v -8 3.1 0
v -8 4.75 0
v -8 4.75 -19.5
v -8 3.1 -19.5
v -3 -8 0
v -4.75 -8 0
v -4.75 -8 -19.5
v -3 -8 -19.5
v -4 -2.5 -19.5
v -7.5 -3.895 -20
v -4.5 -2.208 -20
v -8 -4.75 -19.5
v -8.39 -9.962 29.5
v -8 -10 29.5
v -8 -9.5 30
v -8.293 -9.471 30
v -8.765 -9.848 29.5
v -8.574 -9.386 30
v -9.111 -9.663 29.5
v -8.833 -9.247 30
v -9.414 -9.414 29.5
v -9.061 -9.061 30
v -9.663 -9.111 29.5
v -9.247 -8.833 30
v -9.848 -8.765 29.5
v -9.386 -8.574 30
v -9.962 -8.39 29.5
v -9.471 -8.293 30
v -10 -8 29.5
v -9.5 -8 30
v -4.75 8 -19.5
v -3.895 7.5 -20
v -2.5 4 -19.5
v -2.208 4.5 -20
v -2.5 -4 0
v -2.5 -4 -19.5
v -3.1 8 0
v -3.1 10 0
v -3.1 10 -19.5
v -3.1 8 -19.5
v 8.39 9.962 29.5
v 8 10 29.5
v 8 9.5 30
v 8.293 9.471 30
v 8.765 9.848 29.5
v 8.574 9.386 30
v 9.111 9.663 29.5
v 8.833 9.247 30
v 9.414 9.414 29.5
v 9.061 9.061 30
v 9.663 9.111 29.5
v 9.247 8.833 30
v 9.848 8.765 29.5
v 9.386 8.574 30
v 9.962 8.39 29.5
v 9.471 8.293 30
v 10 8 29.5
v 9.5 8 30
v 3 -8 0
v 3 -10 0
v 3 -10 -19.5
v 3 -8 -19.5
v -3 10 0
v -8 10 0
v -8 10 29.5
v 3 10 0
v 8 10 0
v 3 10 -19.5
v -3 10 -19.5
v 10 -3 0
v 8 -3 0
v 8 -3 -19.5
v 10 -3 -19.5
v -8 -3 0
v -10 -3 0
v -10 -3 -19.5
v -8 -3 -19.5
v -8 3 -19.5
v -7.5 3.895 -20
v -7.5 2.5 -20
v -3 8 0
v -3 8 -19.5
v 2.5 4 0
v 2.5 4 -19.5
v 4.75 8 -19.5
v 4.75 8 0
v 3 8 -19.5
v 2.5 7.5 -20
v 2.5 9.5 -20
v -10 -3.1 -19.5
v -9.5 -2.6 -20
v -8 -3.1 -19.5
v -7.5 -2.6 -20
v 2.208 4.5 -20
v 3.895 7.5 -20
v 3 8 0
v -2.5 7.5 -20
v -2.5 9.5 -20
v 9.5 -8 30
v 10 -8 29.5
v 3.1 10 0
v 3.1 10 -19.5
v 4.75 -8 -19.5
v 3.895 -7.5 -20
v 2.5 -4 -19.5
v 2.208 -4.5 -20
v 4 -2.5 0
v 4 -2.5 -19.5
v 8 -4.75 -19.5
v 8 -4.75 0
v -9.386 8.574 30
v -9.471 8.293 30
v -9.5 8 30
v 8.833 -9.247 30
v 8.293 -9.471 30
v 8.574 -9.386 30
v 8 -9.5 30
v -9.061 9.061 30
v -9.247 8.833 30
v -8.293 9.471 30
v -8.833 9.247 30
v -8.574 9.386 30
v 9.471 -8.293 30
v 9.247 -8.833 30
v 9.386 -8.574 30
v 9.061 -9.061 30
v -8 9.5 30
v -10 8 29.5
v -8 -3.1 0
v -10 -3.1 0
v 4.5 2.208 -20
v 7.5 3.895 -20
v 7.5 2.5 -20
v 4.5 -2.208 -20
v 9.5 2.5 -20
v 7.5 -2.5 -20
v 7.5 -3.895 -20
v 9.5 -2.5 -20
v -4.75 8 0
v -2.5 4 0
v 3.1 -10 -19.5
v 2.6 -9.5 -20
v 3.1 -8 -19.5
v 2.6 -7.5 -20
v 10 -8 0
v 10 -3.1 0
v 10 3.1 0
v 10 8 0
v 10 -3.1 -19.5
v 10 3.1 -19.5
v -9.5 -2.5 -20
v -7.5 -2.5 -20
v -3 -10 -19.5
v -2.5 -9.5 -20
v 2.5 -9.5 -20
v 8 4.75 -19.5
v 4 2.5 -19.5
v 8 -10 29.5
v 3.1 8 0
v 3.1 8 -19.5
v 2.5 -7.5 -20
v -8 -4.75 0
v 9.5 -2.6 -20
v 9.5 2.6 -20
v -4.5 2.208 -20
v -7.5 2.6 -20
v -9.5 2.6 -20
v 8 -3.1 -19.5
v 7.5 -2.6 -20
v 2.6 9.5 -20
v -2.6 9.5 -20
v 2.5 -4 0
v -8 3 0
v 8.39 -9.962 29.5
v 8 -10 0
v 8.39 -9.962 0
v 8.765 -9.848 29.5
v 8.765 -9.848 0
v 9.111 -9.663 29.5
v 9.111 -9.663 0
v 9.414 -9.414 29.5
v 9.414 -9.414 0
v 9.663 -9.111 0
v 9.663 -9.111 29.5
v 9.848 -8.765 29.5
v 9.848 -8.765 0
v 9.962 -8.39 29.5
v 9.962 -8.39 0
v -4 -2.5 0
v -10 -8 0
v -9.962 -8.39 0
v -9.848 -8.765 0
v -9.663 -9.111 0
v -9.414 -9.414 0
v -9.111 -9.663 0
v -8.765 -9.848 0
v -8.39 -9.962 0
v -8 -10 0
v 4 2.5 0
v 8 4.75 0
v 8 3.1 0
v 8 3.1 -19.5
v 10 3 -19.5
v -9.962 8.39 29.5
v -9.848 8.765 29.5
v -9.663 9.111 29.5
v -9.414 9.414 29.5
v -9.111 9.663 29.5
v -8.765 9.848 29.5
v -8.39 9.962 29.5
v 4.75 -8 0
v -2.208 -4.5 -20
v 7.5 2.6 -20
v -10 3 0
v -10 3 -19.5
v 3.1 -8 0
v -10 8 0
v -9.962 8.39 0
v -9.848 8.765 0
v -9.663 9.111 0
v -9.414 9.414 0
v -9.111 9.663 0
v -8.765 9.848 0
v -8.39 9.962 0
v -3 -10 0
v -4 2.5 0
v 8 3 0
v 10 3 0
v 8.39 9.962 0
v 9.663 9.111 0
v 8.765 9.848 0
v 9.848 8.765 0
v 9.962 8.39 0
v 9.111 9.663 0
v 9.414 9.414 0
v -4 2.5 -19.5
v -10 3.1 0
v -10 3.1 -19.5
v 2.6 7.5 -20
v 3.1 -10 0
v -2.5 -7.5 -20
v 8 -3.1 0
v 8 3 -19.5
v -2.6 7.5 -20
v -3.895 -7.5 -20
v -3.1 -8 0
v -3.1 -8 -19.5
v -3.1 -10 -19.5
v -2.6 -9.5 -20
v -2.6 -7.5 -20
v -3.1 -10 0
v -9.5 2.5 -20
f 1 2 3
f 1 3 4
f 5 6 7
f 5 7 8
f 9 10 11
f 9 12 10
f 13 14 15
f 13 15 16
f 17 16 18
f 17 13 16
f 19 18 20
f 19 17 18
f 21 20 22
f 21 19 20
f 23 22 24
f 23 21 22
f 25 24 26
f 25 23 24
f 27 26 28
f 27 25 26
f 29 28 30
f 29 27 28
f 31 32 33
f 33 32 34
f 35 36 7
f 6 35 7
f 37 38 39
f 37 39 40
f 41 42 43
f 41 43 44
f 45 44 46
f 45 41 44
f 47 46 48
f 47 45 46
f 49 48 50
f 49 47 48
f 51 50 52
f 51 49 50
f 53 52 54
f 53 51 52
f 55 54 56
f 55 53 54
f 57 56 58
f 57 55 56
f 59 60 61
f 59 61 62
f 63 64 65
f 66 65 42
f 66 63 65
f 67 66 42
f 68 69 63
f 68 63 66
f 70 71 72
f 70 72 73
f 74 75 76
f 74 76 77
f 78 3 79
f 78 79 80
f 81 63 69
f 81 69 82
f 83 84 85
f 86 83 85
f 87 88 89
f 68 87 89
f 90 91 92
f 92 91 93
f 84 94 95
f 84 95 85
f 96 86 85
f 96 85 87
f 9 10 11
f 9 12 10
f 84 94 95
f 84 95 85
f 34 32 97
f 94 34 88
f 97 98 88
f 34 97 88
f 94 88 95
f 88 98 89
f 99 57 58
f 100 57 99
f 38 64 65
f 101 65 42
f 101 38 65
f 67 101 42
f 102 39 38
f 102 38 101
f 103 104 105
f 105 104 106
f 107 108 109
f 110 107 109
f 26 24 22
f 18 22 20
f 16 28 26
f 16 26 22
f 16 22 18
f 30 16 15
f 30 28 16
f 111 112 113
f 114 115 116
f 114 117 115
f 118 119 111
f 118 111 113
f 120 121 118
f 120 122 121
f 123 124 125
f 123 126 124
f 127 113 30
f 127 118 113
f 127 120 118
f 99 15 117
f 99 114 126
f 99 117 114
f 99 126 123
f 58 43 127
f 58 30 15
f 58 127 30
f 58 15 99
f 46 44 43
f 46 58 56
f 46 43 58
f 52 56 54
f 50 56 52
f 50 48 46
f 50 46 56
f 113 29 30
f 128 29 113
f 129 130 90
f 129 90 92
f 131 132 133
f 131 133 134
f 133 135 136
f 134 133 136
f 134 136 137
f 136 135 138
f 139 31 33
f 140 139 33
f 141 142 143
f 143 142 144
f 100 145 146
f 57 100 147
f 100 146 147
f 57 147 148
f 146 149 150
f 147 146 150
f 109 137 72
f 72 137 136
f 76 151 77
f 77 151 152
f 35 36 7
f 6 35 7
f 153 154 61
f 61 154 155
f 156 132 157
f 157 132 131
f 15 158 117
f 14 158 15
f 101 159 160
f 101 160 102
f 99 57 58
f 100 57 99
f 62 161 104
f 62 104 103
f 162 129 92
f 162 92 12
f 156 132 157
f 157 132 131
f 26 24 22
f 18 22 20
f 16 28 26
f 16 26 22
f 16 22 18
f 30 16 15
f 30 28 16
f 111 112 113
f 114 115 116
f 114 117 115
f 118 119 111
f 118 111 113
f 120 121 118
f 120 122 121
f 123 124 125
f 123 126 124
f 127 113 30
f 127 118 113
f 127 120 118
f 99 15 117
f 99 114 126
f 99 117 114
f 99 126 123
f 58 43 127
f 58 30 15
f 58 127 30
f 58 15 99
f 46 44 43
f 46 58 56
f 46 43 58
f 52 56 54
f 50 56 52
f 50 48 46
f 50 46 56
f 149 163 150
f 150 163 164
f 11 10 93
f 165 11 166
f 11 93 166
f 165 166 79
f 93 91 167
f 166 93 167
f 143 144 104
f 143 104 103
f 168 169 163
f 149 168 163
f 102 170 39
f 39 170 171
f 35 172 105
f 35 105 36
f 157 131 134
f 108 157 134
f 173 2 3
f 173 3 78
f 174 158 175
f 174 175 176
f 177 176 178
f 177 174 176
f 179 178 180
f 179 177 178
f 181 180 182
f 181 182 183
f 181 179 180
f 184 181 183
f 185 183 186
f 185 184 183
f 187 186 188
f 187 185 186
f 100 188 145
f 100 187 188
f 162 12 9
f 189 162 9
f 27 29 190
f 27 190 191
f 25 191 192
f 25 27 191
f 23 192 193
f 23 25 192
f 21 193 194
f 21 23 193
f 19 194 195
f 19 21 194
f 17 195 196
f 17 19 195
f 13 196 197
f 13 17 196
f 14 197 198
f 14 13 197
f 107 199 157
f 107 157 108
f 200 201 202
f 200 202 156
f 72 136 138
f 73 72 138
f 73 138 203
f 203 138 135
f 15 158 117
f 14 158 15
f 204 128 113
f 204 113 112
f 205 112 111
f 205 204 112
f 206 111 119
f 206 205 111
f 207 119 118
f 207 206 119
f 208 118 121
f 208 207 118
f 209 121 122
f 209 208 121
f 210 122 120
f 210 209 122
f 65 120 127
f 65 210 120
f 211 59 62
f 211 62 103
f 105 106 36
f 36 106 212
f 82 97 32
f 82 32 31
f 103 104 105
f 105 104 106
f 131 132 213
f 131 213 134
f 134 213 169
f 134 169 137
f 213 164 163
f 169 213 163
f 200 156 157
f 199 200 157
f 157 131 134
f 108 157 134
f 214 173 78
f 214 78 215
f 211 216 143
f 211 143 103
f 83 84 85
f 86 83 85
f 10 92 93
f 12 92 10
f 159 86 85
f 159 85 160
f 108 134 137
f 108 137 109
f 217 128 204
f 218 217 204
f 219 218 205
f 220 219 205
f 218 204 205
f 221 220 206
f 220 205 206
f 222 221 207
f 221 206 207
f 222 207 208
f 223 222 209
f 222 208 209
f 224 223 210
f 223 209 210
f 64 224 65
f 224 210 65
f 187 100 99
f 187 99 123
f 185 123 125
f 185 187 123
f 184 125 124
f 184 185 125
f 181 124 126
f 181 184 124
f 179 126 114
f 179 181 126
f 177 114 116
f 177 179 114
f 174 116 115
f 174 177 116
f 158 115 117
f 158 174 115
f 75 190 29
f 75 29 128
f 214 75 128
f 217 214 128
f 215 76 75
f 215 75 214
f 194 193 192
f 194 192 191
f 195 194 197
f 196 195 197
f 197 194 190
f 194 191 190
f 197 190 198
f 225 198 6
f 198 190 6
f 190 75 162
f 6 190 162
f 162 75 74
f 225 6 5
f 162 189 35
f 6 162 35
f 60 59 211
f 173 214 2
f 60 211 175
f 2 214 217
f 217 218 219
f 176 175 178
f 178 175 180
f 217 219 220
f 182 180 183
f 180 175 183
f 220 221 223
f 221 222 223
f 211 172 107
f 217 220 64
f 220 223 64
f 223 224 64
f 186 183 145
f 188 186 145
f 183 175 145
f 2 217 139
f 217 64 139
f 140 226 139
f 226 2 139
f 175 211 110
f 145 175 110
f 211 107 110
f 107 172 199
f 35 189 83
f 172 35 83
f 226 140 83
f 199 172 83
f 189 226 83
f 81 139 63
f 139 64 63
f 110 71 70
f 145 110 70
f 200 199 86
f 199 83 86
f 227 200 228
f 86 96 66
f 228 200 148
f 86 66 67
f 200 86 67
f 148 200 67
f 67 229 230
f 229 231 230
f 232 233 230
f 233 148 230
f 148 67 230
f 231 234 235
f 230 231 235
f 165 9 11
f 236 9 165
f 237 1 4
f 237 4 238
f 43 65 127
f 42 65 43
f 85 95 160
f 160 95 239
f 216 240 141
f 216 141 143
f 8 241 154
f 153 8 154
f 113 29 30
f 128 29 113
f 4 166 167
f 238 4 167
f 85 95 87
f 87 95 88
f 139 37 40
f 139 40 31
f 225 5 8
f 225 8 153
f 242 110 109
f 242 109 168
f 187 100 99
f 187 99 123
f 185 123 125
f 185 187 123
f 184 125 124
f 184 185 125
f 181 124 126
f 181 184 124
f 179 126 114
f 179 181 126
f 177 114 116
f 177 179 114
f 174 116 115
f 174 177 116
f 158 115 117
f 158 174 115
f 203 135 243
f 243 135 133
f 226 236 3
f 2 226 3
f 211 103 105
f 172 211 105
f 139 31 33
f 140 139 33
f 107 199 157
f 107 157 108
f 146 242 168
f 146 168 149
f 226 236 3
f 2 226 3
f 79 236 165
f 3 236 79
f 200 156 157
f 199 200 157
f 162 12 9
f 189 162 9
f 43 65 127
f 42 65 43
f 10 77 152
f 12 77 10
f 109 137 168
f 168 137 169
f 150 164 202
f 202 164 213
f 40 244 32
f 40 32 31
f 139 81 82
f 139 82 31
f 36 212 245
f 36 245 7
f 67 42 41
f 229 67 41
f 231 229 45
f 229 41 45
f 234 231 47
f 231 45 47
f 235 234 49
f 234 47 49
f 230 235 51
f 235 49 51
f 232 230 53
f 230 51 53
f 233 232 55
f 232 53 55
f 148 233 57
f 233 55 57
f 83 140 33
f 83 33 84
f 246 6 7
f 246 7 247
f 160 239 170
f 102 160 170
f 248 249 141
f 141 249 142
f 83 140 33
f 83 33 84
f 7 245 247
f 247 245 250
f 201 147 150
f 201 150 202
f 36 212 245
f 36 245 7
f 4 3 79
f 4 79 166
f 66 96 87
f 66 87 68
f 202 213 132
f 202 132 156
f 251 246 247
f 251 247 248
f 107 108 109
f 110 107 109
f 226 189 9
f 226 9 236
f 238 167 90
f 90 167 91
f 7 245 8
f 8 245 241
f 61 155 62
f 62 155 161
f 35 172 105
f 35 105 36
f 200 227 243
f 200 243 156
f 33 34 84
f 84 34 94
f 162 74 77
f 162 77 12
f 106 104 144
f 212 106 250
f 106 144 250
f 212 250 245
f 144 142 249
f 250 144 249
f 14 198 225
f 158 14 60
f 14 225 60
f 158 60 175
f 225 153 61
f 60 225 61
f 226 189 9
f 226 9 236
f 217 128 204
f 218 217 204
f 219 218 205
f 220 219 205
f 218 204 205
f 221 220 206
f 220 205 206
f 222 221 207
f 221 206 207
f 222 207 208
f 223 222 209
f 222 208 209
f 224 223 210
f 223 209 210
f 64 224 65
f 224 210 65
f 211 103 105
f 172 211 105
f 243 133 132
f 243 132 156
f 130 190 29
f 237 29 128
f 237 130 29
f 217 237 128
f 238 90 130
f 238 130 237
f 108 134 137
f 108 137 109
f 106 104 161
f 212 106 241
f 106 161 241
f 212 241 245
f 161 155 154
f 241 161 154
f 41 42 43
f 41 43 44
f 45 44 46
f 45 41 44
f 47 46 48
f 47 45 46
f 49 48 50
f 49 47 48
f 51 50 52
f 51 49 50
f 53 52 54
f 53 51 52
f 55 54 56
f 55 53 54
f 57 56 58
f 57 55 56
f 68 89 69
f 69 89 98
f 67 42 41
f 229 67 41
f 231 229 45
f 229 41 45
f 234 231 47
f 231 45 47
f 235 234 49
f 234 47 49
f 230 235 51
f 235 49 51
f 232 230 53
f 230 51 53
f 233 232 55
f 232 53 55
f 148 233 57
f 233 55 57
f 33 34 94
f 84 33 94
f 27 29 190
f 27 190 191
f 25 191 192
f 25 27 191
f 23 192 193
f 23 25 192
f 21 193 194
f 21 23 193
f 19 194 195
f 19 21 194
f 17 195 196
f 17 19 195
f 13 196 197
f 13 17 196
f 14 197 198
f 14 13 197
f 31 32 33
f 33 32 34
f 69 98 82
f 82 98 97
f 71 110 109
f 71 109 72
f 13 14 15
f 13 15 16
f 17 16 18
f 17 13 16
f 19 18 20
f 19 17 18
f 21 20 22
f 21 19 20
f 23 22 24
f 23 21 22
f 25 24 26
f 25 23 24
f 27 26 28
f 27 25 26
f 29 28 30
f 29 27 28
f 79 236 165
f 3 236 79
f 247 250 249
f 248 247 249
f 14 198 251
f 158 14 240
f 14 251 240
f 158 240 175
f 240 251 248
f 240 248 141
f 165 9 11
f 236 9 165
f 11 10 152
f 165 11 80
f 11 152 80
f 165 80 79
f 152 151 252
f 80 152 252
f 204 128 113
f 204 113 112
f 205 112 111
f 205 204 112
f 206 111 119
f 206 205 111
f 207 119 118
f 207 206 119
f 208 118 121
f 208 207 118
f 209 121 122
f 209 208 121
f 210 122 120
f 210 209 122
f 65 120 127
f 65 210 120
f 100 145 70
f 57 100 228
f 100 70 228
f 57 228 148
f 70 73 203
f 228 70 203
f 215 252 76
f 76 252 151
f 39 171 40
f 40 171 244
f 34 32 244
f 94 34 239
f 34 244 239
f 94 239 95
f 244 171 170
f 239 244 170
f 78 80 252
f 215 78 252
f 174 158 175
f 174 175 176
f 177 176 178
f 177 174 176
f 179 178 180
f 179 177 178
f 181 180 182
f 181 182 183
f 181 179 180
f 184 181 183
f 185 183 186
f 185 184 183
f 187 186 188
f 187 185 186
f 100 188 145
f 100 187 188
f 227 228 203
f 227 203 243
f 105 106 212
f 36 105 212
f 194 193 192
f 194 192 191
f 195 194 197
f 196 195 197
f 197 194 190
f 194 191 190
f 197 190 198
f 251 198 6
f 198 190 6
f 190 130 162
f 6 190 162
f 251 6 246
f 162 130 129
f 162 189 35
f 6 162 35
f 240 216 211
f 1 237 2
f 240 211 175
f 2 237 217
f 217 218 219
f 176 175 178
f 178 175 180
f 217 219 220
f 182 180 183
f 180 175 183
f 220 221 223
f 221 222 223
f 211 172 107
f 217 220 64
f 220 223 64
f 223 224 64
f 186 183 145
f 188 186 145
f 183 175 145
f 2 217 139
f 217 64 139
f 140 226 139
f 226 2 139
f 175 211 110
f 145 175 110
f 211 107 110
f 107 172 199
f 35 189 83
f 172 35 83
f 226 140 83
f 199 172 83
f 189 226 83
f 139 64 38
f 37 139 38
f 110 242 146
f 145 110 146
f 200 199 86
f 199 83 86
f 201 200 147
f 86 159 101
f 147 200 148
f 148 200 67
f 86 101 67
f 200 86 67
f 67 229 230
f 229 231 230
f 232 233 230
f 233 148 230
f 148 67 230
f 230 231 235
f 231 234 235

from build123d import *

# Parameters (mm, degrees)
SKETCH001_W           = 20
SKETCH001_H           = 20
PAD_DEPTH             = 30
PAD001_DEPTH          = 20
POLARPATTERN_COUNT    = 4
FILLET_R              = 2
CHAMFER_SIZE          = 0.5
SKETCH003_W           = 20
SKETCH003_H           = 20
PAD002_DEPTH          = 30
PAD003_DEPTH          = 20
POLARPATTERN001_COUNT = 4
FILLET001_R           = 2
CHAMFER001_SIZE       = 0.5


with BuildPart() as f_6mm:
    # Sketch001 → Pad (new body)
    with BuildSketch(Plane.XY):
        Rectangle(SKETCH001_W, SKETCH001_H)
    extrude(amount=PAD_DEPTH)

    # Sketch → Pad001 (join)
    with BuildSketch(Plane.XY):
        Polygon((-2.5, 4), (2.5, 4), (4.75, 8), (3, 8), (3, 10), (-3, 10), (-3, 8), (-4.75, 8), align=None)
    pad001 = extrude(amount=-PAD001_DEPTH)

    # PolarPattern: Pad001 ×4 about axis
    polarpattern_axis = Axis((0, 0, 0), (0, 0, 1))
    for i in range(1, POLARPATTERN_COUNT):
        add(pad001.rotate(polarpattern_axis, i * 360 / POLARPATTERN_COUNT))

    # Fillet
    fillet_edges = [f_6mm.edges().sort_by_distance(p)[0] for p in [
        (-10, 10, 15),
        (10, 10, 15),
        (10, -10, 15),
        (-10, -10, 15),
    ]]
    fillet(fillet_edges, radius=FILLET_R)

    # Chamfer
    chamfer_edges = [f_6mm.edges().sort_by_distance(p)[0] for p in [
        (0, 10, 30),
        (-9.414214, 9.414214, 30),
        (9.414214, 9.414214, 30),
        (-10, 0, 30),
        (10, 0, 30),
        (-9.414214, -9.414214, 30),
        (9.414214, -9.414214, 30),
        (0, -10, 30),
        (0, 4, -20),
        (3.625, 6, -20),
        (3.875, 8, -20),
        (3, 9, -20),
        (0, 10, -20),
        (-3, 9, -20),
        (-3.875, 8, -20),
        (-3.625, 6, -20),
        (4, 0, -20),
        (6, -3.625, -20),
        (8, -3.875, -20),
        (9, -3, -20),
        (10, 0, -20),
        (9, 3, -20),
        (8, 3.875, -20),
        (6, 3.625, -20),
        (0, -4, -20),
        (-3.625, -6, -20),
        (-3.875, -8, -20),
        (-3, -9, -20),
        (0, -10, -20),
        (3, -9, -20),
        (3.875, -8, -20),
        (3.625, -6, -20),
        (-4, 0, -20),
        (-6, 3.625, -20),
        (-8, 3.875, -20),
        (-9, 3, -20),
        (-10, 0, -20),
        (-9, -3, -20),
        (-8, -3.875, -20),
        (-6, -3.625, -20),
    ]]
    chamfer(chamfer_edges, length=CHAMFER_SIZE)


with BuildPart() as f_6_2mm:
    # Sketch003 → Pad002 (new body)
    with BuildSketch(Plane.XY):
        Rectangle(SKETCH003_W, SKETCH003_H)
    extrude(amount=PAD002_DEPTH)

    # Sketch002 → Pad003 (join)
    with BuildSketch(Plane.XY):
        Polygon((-2.5, 4), (2.5, 4), (4.75, 8), (3.1, 8), (3.1, 10), (-3.1, 10), (-3.1, 8), (-4.75, 8), align=None)
    pad003 = extrude(amount=-PAD003_DEPTH)

    # PolarPattern001: Pad003 ×4 about axis
    polarpattern001_axis = Axis((0, 0, 0), (0, 0, 1))
    for i in range(1, POLARPATTERN001_COUNT):
        add(pad003.rotate(polarpattern001_axis, i * 360 / POLARPATTERN001_COUNT))

    # Fillet001
    fillet001_edges = [f_6_2mm.edges().sort_by_distance(p)[0] for p in [
        (-10, 10, 15),
        (10, 10, 15),
        (10, -10, 15),
        (-10, -10, 15),
    ]]
    fillet(fillet001_edges, radius=FILLET001_R)

    # Chamfer001
    chamfer001_edges = [f_6_2mm.edges().sort_by_distance(p)[0] for p in [
        (0, 10, 30),
        (-9.414214, 9.414214, 30),
        (9.414214, 9.414214, 30),
        (-10, 0, 30),
        (10, 0, 30),
        (-9.414214, -9.414214, 30),
        (9.414214, -9.414214, 30),
        (0, -10, 30),
        (0, 4, -20),
        (3.625, 6, -20),
        (3.925, 8, -20),
        (3.1, 9, -20),
        (0, 10, -20),
        (-3.1, 9, -20),
        (-3.925, 8, -20),
        (-3.625, 6, -20),
        (4, 0, -20),
        (6, -3.625, -20),
        (8, -3.925, -20),
        (9, -3.1, -20),
        (10, 0, -20),
        (9, 3.1, -20),
        (8, 3.925, -20),
        (6, 3.625, -20),
        (0, -4, -20),
        (-3.625, -6, -20),
        (-3.925, -8, -20),
        (-3.1, -9, -20),
        (0, -10, -20),
        (3.1, -9, -20),
        (3.925, -8, -20),
        (3.625, -6, -20),
        (-4, 0, -20),
        (-6, 3.625, -20),
        (-8, 3.925, -20),
        (-9, 3.1, -20),
        (-10, 0, -20),
        (-9, -3.1, -20),
        (-8, -3.925, -20),
        (-6, -3.625, -20),
    ]]
    chamfer(chamfer001_edges, length=CHAMFER001_SIZE)


solid = Compound([f_6mm.part, f_6_2mm.part])
